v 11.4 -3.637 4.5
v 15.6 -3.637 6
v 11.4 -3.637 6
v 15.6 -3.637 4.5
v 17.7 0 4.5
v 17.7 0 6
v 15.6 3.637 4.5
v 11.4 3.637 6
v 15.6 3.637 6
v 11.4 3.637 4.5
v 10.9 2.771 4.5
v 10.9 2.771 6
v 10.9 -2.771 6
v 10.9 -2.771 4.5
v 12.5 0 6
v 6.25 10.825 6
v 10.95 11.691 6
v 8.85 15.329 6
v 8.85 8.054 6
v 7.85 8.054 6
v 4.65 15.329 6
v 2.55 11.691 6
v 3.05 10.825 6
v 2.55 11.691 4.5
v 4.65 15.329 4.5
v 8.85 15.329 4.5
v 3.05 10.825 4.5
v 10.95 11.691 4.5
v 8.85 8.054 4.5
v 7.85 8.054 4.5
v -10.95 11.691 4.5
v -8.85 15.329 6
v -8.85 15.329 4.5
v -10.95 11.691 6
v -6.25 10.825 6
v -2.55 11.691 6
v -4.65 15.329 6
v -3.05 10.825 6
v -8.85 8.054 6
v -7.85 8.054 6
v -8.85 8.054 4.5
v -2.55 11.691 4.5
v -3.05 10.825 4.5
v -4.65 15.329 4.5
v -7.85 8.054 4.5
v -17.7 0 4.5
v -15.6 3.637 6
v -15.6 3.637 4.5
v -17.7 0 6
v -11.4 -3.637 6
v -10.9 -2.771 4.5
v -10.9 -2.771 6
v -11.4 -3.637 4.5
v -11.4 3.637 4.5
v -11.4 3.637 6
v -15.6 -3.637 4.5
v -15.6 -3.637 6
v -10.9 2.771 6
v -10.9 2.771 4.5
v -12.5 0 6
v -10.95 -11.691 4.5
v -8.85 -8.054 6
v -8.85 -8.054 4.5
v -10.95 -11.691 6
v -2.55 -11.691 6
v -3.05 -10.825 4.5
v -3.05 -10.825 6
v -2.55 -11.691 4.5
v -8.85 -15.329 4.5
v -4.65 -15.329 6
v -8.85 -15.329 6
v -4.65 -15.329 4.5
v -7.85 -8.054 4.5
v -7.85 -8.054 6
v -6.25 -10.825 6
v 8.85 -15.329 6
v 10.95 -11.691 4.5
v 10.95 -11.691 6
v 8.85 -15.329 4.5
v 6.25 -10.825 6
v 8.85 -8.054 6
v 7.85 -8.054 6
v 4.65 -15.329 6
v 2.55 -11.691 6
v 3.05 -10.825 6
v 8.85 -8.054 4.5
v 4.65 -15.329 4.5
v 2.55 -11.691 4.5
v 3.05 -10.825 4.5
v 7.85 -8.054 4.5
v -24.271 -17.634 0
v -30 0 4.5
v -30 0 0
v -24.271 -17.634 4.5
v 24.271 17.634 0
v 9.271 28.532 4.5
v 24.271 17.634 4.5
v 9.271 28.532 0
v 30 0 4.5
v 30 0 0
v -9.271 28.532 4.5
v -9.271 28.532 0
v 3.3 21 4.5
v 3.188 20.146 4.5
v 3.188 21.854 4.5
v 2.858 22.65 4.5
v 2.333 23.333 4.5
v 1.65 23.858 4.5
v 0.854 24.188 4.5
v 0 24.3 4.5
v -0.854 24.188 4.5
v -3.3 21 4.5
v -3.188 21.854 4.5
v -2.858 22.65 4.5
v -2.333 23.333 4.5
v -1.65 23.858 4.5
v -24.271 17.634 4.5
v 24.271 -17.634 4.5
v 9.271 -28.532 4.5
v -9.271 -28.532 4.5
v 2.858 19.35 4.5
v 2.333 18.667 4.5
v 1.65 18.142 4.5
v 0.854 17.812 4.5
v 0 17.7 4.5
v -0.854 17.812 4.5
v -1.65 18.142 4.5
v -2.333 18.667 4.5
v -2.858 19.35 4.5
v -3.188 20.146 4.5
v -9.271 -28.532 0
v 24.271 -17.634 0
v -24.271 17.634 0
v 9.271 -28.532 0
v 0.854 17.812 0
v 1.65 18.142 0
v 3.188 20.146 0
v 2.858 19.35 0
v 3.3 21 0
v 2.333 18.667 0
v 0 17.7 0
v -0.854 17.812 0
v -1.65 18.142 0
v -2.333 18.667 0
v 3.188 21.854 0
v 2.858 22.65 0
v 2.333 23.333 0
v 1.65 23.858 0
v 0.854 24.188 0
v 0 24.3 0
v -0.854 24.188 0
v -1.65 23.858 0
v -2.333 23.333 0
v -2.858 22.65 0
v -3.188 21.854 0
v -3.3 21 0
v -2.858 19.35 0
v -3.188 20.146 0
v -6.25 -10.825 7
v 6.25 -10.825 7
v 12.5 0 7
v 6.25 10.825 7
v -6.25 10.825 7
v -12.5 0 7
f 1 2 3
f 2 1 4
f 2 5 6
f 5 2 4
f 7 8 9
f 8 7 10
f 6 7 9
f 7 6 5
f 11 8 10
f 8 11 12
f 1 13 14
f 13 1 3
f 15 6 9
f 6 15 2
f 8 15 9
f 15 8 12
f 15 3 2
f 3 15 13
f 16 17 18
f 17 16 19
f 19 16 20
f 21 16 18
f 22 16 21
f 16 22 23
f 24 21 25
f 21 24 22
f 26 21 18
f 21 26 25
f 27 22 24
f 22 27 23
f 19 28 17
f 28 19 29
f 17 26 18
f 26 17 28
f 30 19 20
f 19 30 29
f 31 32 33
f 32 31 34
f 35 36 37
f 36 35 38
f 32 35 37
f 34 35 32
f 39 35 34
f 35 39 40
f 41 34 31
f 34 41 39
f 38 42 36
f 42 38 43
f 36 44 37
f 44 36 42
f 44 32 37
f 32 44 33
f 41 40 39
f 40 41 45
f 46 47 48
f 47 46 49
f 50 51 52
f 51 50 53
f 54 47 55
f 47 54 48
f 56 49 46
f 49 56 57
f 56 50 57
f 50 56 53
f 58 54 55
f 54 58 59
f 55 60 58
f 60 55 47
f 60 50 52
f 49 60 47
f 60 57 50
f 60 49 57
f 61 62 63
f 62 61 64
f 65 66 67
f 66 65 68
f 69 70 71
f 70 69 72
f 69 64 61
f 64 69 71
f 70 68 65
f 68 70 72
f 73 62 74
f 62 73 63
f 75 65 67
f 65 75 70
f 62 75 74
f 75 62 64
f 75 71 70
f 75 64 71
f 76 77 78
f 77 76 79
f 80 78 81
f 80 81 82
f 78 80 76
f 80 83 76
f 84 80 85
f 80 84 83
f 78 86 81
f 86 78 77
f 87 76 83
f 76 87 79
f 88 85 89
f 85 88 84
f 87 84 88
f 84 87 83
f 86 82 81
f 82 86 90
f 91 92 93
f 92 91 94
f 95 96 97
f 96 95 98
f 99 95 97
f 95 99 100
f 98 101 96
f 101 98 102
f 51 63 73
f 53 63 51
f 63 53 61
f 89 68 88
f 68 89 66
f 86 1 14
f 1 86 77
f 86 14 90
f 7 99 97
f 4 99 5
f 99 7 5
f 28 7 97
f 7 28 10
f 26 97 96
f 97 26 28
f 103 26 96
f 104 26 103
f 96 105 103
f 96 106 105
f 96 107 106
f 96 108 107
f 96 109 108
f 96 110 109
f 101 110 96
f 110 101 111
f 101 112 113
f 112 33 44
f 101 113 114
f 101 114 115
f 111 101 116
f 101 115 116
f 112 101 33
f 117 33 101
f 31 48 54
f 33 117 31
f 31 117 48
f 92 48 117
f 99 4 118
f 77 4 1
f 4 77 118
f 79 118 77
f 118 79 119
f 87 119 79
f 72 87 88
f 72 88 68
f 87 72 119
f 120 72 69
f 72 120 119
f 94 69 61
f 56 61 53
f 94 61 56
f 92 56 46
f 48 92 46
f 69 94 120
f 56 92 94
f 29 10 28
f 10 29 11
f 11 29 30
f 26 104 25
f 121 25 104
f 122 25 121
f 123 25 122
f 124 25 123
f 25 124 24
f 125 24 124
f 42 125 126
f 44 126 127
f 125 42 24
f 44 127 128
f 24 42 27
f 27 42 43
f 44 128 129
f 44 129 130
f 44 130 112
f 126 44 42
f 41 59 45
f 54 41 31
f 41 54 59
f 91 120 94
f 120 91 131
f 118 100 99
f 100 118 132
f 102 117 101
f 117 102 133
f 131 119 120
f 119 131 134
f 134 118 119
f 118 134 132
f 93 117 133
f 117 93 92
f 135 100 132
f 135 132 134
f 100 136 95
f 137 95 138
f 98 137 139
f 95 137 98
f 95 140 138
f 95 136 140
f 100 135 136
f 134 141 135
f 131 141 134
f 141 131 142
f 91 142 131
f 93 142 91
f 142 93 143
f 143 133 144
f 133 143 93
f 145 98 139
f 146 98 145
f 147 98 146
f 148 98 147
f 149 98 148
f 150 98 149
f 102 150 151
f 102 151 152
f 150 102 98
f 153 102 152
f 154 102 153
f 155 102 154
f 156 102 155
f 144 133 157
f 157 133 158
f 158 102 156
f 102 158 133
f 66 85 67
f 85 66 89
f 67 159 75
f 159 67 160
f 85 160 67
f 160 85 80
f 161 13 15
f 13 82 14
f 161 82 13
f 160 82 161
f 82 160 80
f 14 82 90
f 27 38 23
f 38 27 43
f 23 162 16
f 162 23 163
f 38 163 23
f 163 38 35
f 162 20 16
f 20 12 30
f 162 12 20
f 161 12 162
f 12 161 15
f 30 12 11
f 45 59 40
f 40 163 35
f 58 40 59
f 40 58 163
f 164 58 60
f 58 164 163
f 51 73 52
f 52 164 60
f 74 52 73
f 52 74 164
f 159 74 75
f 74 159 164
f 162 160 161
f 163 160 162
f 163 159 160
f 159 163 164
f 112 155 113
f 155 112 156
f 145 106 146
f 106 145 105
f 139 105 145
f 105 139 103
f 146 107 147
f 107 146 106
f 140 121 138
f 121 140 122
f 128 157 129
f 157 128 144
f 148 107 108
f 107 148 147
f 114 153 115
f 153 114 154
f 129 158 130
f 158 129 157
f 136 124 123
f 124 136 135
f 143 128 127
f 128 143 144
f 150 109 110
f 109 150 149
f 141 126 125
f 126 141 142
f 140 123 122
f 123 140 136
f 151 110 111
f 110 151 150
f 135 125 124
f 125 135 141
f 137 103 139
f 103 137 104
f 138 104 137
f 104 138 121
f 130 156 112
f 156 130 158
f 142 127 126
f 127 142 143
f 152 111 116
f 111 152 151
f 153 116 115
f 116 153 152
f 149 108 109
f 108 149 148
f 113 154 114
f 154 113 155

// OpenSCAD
// file: lib/commerce_forms.scad
// Original parametric printable prototypes. Dimensions in millimeters.
// CAD is the manufacturing authority; Three.js gallery geometry is a stylized preview.
// No external copyrighted silhouettes, brands, logos or character geometry.
$fn=56;
module market_lantern(v=1) {
  r=27+v*2; h=76+v*6; wall=2.8;
  difference() {
    cylinder(r=r,h=h);
    translate([0,0,-1]) cylinder(r=r-wall,h=h+2);
    for (tier=[0:3], j=[0:7+v]) {
      a=360*j/(8+v)+tier*15;
      rotate([0,0,a])
        translate([r-1,0,17+tier*(h-33)/3])
          rotate([0,90,0]) cylinder(r=2.2+(v%3)*.5,h=10,center=true,$fn=18);
    }
  }
}
module market_figurine(v=1) {
  r=18+v;
  union() {
    cylinder(r=29,h=6);
    translate([0,0,7]) scale([1,0.85,1.15]) sphere(r=r);
    translate([0,0,35]) scale([1,.91,.84]) sphere(r=r*.78);
    for (s=[-1,1]) {
      translate([s*(r*.58),0,49])
        rotate([0,s*13,0]) cylinder(r1=5+v*.4,r2=1,h=10+v*2);
      translate([s*(r*.73),-2,20]) scale([.36,.55,.67]) sphere(r=r*.75);
    }
    translate([0,-r*.62,39]) sphere(r=3.5+v*.2);
    for(s=[-1,1])translate([s*7,-r*.72,43])sphere(r=1.8);
  }
}
module market_scenery(v=1) {
  union() {
    translate([-52,-32,0]) cube([104,64,4]);
    for (i=[0:2+v%2]) {
      x=-40+i*24;
      translate([x, -14+(i%2)*12,3.8])
        cube([15+v*2,19,13+v*3]);
      translate([x+2,-13+(i%2)*12,16+v*3])
        cube([11+v*2,15,3]);
    }
    for(i=[-1,1]) {
      translate([i*42,20,3.8]) cylinder(r=5,h=12+v*4);
      translate([i*42,20,15+v*4]) sphere(r=6);
    }
  }
}
module market_organizer(v=1) {
  w=104+v*5;d=69+v*3;h=32+v*3; columns=2+v%3;
  difference() {
    translate([-w/2,-d/2,0]) cube([w,d,h]);
    for(i=[0:columns-1])
      translate([-w/2+3+i*(w-6)/columns,-d/2+3,4])
        cube([(w-6)/columns-3,d-6,h+3]);
  }
}
module market_display(v=1) {
  union() {
    cylinder(r=34+v*2,h=6);
    translate([0,0,5.8]) cylinder(r1=12+v,r2=9,h=26+v*3);
    translate([0,0,30+v*3]) cylinder(r=25+v,h=5);
    for(s=[-1,1])
      translate([s*(16+v),0,34+v*3])
        cube([5,31,10],center=true);
  }
}
module market_gaming(v=1) {
  w=102+v*5;d=66+v*2; h=22+v*3;
  difference() {
    union() {
      translate([-w/2,-d/2,0]) cube([w,d,h]);
      translate([-w/2, d/2-14,h-1]) cube([w,12,15+v]);
    }
    translate([-w/2+5,-d/2+5,5]) cube([w-10,d-24,h+12]);
    for(i=[-1,0,1])
      translate([i*24,d/2-13,h+6]) rotate([90,0,0])
        cylinder(r=3.6+v*.3,h=16,$fn=22);
  }
}
module market_jewelry(v=1) {
  union() {
    translate([-40,-26,0]) cube([80,52,6]);
    for (i=[0:3+v%2]) {
      x=-29+i*58/(3+v%2);
      translate([x,0,5.8]) cylinder(r=3.2,h=42+v*5,$fn=24);
      translate([x,0,46+v*5]) sphere(r=5);
    }
    translate([-33,-5,42+v*5]) cube([66,9,6]);
    for(i=[0:4])translate([-25+i*12,0,46+v*5])
      cylinder(r1=4,r2=1.5,h=7,$fn=20);
  }
}
module market_planter(v=1) {
  r=34+v*2; h=48+v*6; w=3.2;
  difference() {
    union() {
      cylinder(r=r,h=h);
      for(i=[0:9+v])
        rotate([0,0,360*i/(10+v)])
          translate([r-.5,-1.6,2]) cube([2.2,3.2,h-4]);
    }
    translate([0,0,3.8]) cylinder(r=r-w,h=h+2);
    translate([0,0,-1]) cylinder(r=2.8,h=7,$fn=24);
  }
}
module market_gift(v=1,label="CUSTOM") {
  w=100+v*6;d=49+v*3;
  difference() {
    union() {
      hull()for(x=[-w/2+7,w/2-7],y=[-d/2+7,d/2-7])
        translate([x,y,0]) cylinder(r=7,h=6,$fn=24);
      translate([0,0,5.8]) linear_extrude(height=2.2)
        text(label,size=max(9,18-v),halign="center",valign="center",
             font="Liberation Sans:style=Bold");
    }
    if(v==3)for(x=[-w/2+10,w/2-10])
      translate([x,d/2-10,-1]) cylinder(r=2.5,h=10,$fn=24);
  }
}
module market_cosplay(v=1) {
  r=28+v*2;
  difference() {
    union() {
      cylinder(r=r,h=4.5,$fn=8+v*2);
      for(i=[0:4+v])
        rotate([0,0,360*i/(5+v)])
          translate([r*.45,0,4.2]) cylinder(r=4.2,h=1.8,$fn=6);
      cylinder(r=12+v*.5,h=7,$fn=5+v);
    }
    translate([0,r*.70,-1])cylinder(r=3.3,h=10,$fn=24);
  }
}
module commercial_form(family="lantern",variant=1,label="CUSTOM") {
  if(family=="lantern")market_lantern(variant);
  else if(family=="figurine")market_figurine(variant);
  else if(family=="scenery")market_scenery(variant);
  else if(family=="organizer")market_organizer(variant);
  else if(family=="display")market_display(variant);
  else if(family=="gaming")market_gaming(variant);
  else if(family=="jewelry")market_jewelry(variant);
  else if(family=="planter")market_planter(variant);
  else if(family=="gift")market_gift(variant,label);
  else if(family=="cosplay")market_cosplay(variant);
  else assert(false,str("Unknown family: ",family));
}
// main file
// Original 3D printable CAD prototype for Celestial Guild Medallion
// Millimeter units; edit parameters and print-test before commercial shipment.
use <lib/commerce_forms.scad>
commercial_form(family="cosplay",variant=1);
